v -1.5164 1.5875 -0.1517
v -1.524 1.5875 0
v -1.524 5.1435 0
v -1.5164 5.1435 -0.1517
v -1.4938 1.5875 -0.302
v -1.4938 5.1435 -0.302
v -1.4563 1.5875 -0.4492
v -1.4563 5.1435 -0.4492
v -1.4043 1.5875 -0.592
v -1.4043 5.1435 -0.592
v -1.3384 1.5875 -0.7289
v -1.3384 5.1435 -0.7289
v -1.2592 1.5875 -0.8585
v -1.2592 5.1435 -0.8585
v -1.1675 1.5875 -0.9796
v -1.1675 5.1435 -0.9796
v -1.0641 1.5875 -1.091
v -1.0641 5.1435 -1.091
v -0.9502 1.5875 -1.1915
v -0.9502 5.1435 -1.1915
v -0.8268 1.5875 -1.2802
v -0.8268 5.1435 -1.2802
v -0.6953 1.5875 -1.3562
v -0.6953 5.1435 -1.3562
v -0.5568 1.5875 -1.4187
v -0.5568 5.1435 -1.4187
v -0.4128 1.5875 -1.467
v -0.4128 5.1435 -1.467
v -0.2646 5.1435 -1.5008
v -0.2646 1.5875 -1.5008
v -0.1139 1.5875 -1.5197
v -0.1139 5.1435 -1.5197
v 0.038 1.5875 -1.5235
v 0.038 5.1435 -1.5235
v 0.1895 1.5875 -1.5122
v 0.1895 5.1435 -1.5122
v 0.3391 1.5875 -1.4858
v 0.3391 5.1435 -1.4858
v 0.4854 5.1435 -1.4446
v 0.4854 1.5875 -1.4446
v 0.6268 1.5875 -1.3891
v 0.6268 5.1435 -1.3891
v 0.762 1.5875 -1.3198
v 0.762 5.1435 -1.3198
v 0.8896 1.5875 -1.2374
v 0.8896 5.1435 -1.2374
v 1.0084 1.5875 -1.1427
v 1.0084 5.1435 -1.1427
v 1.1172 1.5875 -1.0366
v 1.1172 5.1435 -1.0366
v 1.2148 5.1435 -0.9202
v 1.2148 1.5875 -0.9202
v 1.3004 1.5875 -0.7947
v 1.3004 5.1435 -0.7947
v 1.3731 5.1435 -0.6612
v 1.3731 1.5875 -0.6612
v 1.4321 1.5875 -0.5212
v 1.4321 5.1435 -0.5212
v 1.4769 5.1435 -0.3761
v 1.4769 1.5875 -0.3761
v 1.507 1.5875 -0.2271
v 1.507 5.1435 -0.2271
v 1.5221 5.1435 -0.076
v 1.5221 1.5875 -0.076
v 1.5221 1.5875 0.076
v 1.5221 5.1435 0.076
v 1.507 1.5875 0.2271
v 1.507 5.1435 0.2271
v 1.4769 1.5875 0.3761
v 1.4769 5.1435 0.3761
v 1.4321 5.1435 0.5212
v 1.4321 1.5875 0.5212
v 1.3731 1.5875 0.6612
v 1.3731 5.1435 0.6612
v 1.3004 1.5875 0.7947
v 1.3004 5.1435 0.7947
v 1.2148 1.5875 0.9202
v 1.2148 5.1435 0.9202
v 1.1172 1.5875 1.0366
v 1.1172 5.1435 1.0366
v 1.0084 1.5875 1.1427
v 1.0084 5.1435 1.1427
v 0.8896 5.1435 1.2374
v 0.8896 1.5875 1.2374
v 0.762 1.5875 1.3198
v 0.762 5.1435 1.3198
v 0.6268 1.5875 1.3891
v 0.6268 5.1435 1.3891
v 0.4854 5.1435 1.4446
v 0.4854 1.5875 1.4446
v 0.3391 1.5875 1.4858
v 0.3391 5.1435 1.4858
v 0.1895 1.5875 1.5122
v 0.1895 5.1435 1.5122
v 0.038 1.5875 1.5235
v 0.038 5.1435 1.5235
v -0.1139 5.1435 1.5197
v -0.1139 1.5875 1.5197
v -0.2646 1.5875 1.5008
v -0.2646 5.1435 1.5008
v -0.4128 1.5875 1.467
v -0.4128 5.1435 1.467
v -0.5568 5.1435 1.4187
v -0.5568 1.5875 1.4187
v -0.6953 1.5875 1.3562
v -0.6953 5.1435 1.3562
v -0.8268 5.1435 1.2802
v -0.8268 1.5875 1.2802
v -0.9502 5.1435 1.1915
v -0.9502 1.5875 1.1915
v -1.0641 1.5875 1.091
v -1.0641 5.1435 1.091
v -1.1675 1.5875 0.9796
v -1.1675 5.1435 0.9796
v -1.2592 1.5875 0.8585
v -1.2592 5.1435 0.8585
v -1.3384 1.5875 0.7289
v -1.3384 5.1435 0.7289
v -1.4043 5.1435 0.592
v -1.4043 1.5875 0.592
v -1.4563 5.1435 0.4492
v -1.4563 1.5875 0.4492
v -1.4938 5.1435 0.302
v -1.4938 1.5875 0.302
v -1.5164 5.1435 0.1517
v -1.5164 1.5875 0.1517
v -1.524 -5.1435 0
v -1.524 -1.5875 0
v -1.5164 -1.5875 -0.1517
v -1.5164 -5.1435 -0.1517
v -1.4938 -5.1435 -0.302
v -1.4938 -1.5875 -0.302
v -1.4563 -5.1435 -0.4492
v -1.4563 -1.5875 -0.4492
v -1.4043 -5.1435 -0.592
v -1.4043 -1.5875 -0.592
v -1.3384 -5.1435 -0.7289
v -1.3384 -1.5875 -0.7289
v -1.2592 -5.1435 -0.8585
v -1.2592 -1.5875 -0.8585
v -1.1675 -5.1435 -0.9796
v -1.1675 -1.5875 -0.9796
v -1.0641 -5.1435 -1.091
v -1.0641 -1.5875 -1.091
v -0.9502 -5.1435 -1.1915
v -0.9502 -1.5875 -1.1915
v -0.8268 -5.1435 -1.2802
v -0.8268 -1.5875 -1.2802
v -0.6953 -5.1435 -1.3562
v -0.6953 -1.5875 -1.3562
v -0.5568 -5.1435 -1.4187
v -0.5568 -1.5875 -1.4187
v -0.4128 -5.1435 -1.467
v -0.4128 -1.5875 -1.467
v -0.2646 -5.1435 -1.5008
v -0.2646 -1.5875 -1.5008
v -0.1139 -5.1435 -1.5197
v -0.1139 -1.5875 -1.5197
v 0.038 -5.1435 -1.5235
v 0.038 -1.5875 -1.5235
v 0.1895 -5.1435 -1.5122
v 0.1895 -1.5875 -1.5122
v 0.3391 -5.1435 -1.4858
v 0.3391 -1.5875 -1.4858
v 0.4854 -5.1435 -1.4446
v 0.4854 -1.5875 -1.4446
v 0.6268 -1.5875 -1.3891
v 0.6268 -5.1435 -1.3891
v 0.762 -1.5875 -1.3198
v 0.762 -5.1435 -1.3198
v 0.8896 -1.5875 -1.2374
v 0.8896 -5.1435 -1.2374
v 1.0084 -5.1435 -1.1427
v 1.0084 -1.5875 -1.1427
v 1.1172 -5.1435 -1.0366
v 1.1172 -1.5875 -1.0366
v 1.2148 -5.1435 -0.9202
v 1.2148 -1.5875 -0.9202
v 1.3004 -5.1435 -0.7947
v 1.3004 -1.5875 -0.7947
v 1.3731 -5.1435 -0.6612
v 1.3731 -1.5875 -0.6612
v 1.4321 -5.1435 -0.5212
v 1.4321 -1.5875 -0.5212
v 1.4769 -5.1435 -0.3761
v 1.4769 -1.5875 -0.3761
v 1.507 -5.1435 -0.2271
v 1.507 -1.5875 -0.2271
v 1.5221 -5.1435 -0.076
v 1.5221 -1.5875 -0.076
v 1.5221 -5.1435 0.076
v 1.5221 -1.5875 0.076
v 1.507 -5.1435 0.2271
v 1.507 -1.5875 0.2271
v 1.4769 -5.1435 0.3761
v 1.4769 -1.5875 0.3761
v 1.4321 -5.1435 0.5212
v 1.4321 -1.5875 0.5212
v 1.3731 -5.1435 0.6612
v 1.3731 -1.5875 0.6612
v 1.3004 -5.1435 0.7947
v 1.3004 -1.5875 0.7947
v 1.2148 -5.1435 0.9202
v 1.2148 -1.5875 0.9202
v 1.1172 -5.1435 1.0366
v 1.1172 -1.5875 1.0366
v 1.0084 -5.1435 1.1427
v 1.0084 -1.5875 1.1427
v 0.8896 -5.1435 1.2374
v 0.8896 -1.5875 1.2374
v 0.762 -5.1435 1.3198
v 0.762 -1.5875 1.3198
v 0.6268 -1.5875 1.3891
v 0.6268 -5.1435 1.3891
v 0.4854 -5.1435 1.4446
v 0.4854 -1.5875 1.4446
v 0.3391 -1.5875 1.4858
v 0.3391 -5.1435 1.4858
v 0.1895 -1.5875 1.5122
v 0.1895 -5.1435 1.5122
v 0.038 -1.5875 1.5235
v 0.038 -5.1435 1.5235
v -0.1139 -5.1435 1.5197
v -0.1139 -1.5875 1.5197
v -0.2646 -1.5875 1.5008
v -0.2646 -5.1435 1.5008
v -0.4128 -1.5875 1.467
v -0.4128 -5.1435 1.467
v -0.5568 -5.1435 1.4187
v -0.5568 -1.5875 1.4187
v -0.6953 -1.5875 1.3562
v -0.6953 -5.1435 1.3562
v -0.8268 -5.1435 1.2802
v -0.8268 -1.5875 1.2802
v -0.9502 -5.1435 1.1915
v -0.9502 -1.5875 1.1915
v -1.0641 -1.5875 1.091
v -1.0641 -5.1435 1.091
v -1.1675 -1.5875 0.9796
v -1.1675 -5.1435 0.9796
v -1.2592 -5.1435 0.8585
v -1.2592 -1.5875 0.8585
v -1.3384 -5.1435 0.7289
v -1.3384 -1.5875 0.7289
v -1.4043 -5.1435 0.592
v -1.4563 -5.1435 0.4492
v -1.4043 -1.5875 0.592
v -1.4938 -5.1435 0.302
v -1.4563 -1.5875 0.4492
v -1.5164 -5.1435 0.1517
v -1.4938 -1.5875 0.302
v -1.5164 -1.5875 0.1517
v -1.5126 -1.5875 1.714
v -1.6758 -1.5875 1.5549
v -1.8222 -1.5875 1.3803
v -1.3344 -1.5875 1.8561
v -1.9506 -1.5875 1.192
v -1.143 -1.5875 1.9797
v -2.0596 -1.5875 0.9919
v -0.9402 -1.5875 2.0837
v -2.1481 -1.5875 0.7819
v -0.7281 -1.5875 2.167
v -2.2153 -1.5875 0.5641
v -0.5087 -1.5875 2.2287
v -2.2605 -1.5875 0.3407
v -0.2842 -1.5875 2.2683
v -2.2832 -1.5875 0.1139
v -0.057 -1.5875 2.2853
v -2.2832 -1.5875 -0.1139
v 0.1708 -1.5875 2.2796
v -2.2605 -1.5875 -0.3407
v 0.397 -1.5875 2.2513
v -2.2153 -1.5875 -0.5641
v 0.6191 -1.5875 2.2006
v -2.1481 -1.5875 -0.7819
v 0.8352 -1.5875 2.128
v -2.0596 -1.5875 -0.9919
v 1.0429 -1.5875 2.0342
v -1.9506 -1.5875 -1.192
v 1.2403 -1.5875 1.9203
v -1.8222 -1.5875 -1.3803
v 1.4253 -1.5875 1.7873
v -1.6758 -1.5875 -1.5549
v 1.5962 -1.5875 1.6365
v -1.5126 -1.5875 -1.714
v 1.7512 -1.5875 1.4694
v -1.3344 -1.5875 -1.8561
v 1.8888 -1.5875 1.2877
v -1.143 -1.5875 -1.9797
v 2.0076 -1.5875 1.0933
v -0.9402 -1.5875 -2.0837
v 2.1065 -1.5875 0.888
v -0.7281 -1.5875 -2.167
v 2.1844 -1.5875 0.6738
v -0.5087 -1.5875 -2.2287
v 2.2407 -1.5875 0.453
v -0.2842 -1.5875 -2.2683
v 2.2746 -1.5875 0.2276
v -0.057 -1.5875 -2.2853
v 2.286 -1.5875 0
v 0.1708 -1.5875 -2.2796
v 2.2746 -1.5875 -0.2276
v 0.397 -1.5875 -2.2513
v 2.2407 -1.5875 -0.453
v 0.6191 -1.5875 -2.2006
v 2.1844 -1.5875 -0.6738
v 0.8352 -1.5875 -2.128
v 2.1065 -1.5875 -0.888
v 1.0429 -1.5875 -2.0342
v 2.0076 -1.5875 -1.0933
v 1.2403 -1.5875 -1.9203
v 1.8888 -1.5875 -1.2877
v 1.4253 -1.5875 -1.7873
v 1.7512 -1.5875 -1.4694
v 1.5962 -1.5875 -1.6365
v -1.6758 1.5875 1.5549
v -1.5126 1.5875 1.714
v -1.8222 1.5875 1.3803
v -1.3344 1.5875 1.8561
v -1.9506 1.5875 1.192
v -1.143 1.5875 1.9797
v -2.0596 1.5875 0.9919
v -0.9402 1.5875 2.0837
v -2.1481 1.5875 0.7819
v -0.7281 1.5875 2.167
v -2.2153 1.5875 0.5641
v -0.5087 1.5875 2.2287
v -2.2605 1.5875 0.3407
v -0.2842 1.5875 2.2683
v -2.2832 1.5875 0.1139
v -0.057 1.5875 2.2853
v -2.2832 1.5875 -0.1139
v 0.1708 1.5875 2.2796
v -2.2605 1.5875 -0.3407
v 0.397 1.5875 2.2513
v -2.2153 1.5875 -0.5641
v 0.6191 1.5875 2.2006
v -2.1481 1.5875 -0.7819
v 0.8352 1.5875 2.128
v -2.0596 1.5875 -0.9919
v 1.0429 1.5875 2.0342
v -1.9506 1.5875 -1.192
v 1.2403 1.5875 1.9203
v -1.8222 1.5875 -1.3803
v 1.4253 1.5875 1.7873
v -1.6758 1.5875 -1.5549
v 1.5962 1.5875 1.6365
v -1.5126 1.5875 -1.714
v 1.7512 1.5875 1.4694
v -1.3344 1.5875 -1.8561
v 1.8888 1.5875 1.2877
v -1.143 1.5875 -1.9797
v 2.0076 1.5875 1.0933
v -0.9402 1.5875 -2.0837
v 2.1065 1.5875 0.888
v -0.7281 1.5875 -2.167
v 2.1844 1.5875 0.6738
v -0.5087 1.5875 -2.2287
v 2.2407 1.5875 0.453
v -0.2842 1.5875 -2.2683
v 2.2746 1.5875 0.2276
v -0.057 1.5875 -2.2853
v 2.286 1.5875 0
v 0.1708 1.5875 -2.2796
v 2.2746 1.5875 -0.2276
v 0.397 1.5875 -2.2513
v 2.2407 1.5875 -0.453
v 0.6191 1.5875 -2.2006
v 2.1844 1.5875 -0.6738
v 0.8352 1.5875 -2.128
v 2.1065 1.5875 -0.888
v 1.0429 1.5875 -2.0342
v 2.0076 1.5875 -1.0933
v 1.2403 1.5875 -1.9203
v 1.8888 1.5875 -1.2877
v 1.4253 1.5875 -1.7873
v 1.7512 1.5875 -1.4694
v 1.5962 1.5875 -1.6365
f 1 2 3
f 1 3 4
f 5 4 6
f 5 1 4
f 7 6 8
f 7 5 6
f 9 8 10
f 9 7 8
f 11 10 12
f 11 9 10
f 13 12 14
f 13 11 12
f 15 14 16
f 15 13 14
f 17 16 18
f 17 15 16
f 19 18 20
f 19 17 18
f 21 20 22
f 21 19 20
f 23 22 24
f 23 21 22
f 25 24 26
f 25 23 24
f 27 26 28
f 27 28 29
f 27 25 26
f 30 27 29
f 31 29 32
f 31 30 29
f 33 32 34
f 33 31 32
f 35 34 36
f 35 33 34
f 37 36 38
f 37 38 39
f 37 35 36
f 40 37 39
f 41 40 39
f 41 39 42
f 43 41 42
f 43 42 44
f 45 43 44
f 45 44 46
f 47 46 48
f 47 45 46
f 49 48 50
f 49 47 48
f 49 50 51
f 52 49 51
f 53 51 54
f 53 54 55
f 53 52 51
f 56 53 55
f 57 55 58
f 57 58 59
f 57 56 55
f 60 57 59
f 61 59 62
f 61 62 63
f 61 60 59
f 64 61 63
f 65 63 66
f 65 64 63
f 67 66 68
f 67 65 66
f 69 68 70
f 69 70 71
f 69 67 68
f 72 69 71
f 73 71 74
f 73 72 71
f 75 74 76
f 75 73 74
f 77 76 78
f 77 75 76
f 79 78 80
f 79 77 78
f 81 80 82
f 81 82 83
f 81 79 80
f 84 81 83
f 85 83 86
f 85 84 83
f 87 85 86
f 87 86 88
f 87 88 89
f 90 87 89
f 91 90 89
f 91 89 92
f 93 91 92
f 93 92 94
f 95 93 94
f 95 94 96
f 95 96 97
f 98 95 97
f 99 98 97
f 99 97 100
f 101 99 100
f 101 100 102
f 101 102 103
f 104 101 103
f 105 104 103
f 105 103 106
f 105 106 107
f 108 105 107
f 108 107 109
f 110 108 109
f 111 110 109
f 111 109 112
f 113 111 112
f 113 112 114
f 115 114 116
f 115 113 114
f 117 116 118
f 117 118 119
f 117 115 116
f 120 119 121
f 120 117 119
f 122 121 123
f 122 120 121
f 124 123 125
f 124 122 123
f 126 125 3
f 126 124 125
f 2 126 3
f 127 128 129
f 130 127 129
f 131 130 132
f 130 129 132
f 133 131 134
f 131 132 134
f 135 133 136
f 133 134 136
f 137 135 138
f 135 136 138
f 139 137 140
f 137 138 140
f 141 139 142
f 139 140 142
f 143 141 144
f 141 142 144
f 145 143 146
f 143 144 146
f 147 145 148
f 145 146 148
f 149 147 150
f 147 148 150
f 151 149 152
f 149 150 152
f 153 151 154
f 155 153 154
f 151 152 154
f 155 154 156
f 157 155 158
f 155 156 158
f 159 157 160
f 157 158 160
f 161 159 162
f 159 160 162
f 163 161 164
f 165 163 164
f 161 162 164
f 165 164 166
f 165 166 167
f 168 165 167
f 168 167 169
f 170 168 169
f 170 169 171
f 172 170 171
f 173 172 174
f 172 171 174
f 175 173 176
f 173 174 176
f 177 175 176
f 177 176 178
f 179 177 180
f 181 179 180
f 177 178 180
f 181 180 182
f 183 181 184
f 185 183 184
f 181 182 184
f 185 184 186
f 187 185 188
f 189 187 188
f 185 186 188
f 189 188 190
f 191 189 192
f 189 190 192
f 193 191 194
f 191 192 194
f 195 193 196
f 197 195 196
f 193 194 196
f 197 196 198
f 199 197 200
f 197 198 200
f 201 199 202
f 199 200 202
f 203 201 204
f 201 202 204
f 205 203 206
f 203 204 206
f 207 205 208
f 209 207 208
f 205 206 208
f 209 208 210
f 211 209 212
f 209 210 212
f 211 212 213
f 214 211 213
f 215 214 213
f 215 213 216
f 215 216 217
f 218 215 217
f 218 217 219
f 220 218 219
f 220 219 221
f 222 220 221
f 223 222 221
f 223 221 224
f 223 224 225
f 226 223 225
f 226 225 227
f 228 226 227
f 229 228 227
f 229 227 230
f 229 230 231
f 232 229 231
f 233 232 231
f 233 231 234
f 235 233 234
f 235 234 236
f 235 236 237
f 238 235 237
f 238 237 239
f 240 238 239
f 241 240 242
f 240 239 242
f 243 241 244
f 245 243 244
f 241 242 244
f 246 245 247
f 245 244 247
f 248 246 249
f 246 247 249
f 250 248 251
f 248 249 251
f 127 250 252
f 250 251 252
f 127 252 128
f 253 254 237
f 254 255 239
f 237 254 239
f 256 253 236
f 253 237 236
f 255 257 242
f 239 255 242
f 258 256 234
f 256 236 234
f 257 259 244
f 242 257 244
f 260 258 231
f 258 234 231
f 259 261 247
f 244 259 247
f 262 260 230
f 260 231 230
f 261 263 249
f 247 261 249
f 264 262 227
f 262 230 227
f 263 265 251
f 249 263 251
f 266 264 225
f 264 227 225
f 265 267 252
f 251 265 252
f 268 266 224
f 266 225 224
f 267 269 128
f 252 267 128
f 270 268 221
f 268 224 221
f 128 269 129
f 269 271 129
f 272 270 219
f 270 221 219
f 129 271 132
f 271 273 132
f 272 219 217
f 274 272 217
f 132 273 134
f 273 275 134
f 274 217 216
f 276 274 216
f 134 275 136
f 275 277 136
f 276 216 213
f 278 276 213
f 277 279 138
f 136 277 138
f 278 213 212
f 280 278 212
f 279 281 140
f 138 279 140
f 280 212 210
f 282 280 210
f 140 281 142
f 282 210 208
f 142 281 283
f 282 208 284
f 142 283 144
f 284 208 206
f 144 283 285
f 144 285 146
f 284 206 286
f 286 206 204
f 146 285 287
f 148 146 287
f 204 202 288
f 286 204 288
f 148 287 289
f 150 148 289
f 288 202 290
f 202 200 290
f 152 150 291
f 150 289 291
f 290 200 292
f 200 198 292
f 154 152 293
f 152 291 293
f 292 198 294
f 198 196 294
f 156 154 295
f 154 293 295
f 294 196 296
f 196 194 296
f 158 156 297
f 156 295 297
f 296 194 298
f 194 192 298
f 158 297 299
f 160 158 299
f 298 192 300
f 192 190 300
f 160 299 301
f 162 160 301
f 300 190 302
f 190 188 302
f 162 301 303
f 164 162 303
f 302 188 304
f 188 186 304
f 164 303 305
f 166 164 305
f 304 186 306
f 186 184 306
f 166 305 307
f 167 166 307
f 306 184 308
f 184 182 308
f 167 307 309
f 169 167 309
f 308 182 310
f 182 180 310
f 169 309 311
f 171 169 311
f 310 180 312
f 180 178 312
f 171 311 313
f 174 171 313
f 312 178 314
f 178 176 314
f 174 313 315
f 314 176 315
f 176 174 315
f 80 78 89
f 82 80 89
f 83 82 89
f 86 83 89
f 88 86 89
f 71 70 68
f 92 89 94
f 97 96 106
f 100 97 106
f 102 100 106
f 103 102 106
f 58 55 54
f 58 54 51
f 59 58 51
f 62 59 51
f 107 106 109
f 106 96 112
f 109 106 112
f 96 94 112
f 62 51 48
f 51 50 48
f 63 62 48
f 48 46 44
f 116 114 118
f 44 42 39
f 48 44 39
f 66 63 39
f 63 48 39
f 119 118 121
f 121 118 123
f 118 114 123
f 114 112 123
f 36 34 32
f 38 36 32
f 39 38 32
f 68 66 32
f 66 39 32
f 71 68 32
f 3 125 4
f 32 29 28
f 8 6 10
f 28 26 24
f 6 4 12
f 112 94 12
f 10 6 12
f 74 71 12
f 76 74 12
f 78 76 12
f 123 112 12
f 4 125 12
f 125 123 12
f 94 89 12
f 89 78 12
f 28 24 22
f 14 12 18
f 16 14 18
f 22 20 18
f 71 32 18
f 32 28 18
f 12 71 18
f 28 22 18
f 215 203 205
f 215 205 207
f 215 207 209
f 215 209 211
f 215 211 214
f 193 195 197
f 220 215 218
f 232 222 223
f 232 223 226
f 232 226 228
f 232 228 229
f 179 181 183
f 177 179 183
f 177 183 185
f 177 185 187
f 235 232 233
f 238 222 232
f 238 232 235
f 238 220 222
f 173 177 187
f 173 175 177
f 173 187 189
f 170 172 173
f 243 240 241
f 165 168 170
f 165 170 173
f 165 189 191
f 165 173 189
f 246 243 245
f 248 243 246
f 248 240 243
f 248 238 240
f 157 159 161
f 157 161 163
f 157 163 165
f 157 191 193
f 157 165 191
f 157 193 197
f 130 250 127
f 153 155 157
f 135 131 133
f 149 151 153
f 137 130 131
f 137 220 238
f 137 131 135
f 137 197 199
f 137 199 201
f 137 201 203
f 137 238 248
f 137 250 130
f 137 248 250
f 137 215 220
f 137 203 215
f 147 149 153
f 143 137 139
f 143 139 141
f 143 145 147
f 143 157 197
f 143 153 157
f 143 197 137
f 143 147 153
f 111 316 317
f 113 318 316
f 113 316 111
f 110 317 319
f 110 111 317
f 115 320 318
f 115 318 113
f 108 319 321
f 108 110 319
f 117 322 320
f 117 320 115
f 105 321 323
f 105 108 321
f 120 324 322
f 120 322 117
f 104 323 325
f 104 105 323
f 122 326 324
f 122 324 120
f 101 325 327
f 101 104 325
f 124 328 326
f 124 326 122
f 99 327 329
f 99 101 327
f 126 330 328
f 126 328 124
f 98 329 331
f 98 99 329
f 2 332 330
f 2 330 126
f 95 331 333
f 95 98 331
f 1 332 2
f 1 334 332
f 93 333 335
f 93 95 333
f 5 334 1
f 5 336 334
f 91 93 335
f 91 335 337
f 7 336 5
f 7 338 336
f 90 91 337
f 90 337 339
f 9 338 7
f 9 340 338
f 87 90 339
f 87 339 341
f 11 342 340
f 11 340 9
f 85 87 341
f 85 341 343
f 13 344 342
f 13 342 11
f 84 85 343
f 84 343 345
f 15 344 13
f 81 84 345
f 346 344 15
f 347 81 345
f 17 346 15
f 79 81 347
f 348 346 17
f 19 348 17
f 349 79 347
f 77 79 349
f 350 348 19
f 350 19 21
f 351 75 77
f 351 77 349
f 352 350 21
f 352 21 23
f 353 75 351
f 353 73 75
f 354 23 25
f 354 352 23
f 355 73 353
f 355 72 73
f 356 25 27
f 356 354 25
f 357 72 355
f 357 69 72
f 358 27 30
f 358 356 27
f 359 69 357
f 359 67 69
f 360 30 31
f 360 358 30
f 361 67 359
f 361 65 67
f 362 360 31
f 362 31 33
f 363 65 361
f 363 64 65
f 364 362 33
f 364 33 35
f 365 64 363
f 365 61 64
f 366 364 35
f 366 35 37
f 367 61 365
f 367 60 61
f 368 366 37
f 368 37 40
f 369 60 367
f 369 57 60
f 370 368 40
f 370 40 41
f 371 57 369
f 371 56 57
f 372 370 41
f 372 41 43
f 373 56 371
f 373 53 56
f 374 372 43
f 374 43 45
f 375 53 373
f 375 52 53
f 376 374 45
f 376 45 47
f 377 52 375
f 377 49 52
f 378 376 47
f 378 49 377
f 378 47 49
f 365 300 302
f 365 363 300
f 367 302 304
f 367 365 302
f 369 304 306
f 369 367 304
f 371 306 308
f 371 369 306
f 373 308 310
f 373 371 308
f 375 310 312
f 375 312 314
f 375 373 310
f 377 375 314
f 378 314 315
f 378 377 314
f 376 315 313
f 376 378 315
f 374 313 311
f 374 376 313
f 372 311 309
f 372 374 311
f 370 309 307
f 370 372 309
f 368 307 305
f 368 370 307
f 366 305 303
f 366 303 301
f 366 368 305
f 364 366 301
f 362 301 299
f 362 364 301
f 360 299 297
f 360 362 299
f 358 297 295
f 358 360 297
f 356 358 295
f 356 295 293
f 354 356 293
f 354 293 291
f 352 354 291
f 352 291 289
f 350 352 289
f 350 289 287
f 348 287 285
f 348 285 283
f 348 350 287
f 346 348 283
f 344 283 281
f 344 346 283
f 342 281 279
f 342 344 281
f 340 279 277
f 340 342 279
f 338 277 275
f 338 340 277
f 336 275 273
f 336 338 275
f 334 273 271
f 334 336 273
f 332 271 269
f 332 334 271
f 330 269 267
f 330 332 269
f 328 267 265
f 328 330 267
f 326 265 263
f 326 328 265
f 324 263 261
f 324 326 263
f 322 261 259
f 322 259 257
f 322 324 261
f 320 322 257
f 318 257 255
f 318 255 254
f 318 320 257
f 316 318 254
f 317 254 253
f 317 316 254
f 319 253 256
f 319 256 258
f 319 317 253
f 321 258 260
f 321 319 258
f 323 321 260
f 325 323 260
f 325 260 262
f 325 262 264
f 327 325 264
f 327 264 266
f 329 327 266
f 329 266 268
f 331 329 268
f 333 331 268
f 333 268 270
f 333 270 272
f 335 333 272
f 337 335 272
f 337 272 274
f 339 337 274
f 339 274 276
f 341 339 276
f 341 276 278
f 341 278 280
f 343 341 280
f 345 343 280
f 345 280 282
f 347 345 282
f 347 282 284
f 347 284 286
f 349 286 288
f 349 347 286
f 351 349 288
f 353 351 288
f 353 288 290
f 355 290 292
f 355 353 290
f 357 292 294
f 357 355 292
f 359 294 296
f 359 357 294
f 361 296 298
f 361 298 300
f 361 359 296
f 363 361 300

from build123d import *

# Parameters (mm, degrees)
SKETCH1_R           = 2.286
BOSS_EXTRUDE1_DEPTH = 1.5875
SKETCH2_R           = 1.524
BOSS_EXTRUDE2_DEPTH = 3.556


with BuildPart() as part:
    # Sketch1 → Boss-Extrude1 (new body, symmetric)
    with BuildSketch(Plane(origin=(0, 0, 0), x_dir=(1, 0, 0), z_dir=(0, 1, 0))):
        Circle(SKETCH1_R)
    extrude(amount=BOSS_EXTRUDE1_DEPTH, both=True)

    # Sketch2 → Boss-Extrude2 (add)
    with BuildSketch(Plane(origin=(0, -1.5875, 0), x_dir=(-1, 0, 0), z_dir=(0, -1, 0))):
        Circle(SKETCH2_R)
    boss_extrude2 = extrude(amount=BOSS_EXTRUDE2_DEPTH)

    # Mirror1: Boss-Extrude2 across plane
    add(boss_extrude2.mirror(Plane.ZX))


solid = part.part
